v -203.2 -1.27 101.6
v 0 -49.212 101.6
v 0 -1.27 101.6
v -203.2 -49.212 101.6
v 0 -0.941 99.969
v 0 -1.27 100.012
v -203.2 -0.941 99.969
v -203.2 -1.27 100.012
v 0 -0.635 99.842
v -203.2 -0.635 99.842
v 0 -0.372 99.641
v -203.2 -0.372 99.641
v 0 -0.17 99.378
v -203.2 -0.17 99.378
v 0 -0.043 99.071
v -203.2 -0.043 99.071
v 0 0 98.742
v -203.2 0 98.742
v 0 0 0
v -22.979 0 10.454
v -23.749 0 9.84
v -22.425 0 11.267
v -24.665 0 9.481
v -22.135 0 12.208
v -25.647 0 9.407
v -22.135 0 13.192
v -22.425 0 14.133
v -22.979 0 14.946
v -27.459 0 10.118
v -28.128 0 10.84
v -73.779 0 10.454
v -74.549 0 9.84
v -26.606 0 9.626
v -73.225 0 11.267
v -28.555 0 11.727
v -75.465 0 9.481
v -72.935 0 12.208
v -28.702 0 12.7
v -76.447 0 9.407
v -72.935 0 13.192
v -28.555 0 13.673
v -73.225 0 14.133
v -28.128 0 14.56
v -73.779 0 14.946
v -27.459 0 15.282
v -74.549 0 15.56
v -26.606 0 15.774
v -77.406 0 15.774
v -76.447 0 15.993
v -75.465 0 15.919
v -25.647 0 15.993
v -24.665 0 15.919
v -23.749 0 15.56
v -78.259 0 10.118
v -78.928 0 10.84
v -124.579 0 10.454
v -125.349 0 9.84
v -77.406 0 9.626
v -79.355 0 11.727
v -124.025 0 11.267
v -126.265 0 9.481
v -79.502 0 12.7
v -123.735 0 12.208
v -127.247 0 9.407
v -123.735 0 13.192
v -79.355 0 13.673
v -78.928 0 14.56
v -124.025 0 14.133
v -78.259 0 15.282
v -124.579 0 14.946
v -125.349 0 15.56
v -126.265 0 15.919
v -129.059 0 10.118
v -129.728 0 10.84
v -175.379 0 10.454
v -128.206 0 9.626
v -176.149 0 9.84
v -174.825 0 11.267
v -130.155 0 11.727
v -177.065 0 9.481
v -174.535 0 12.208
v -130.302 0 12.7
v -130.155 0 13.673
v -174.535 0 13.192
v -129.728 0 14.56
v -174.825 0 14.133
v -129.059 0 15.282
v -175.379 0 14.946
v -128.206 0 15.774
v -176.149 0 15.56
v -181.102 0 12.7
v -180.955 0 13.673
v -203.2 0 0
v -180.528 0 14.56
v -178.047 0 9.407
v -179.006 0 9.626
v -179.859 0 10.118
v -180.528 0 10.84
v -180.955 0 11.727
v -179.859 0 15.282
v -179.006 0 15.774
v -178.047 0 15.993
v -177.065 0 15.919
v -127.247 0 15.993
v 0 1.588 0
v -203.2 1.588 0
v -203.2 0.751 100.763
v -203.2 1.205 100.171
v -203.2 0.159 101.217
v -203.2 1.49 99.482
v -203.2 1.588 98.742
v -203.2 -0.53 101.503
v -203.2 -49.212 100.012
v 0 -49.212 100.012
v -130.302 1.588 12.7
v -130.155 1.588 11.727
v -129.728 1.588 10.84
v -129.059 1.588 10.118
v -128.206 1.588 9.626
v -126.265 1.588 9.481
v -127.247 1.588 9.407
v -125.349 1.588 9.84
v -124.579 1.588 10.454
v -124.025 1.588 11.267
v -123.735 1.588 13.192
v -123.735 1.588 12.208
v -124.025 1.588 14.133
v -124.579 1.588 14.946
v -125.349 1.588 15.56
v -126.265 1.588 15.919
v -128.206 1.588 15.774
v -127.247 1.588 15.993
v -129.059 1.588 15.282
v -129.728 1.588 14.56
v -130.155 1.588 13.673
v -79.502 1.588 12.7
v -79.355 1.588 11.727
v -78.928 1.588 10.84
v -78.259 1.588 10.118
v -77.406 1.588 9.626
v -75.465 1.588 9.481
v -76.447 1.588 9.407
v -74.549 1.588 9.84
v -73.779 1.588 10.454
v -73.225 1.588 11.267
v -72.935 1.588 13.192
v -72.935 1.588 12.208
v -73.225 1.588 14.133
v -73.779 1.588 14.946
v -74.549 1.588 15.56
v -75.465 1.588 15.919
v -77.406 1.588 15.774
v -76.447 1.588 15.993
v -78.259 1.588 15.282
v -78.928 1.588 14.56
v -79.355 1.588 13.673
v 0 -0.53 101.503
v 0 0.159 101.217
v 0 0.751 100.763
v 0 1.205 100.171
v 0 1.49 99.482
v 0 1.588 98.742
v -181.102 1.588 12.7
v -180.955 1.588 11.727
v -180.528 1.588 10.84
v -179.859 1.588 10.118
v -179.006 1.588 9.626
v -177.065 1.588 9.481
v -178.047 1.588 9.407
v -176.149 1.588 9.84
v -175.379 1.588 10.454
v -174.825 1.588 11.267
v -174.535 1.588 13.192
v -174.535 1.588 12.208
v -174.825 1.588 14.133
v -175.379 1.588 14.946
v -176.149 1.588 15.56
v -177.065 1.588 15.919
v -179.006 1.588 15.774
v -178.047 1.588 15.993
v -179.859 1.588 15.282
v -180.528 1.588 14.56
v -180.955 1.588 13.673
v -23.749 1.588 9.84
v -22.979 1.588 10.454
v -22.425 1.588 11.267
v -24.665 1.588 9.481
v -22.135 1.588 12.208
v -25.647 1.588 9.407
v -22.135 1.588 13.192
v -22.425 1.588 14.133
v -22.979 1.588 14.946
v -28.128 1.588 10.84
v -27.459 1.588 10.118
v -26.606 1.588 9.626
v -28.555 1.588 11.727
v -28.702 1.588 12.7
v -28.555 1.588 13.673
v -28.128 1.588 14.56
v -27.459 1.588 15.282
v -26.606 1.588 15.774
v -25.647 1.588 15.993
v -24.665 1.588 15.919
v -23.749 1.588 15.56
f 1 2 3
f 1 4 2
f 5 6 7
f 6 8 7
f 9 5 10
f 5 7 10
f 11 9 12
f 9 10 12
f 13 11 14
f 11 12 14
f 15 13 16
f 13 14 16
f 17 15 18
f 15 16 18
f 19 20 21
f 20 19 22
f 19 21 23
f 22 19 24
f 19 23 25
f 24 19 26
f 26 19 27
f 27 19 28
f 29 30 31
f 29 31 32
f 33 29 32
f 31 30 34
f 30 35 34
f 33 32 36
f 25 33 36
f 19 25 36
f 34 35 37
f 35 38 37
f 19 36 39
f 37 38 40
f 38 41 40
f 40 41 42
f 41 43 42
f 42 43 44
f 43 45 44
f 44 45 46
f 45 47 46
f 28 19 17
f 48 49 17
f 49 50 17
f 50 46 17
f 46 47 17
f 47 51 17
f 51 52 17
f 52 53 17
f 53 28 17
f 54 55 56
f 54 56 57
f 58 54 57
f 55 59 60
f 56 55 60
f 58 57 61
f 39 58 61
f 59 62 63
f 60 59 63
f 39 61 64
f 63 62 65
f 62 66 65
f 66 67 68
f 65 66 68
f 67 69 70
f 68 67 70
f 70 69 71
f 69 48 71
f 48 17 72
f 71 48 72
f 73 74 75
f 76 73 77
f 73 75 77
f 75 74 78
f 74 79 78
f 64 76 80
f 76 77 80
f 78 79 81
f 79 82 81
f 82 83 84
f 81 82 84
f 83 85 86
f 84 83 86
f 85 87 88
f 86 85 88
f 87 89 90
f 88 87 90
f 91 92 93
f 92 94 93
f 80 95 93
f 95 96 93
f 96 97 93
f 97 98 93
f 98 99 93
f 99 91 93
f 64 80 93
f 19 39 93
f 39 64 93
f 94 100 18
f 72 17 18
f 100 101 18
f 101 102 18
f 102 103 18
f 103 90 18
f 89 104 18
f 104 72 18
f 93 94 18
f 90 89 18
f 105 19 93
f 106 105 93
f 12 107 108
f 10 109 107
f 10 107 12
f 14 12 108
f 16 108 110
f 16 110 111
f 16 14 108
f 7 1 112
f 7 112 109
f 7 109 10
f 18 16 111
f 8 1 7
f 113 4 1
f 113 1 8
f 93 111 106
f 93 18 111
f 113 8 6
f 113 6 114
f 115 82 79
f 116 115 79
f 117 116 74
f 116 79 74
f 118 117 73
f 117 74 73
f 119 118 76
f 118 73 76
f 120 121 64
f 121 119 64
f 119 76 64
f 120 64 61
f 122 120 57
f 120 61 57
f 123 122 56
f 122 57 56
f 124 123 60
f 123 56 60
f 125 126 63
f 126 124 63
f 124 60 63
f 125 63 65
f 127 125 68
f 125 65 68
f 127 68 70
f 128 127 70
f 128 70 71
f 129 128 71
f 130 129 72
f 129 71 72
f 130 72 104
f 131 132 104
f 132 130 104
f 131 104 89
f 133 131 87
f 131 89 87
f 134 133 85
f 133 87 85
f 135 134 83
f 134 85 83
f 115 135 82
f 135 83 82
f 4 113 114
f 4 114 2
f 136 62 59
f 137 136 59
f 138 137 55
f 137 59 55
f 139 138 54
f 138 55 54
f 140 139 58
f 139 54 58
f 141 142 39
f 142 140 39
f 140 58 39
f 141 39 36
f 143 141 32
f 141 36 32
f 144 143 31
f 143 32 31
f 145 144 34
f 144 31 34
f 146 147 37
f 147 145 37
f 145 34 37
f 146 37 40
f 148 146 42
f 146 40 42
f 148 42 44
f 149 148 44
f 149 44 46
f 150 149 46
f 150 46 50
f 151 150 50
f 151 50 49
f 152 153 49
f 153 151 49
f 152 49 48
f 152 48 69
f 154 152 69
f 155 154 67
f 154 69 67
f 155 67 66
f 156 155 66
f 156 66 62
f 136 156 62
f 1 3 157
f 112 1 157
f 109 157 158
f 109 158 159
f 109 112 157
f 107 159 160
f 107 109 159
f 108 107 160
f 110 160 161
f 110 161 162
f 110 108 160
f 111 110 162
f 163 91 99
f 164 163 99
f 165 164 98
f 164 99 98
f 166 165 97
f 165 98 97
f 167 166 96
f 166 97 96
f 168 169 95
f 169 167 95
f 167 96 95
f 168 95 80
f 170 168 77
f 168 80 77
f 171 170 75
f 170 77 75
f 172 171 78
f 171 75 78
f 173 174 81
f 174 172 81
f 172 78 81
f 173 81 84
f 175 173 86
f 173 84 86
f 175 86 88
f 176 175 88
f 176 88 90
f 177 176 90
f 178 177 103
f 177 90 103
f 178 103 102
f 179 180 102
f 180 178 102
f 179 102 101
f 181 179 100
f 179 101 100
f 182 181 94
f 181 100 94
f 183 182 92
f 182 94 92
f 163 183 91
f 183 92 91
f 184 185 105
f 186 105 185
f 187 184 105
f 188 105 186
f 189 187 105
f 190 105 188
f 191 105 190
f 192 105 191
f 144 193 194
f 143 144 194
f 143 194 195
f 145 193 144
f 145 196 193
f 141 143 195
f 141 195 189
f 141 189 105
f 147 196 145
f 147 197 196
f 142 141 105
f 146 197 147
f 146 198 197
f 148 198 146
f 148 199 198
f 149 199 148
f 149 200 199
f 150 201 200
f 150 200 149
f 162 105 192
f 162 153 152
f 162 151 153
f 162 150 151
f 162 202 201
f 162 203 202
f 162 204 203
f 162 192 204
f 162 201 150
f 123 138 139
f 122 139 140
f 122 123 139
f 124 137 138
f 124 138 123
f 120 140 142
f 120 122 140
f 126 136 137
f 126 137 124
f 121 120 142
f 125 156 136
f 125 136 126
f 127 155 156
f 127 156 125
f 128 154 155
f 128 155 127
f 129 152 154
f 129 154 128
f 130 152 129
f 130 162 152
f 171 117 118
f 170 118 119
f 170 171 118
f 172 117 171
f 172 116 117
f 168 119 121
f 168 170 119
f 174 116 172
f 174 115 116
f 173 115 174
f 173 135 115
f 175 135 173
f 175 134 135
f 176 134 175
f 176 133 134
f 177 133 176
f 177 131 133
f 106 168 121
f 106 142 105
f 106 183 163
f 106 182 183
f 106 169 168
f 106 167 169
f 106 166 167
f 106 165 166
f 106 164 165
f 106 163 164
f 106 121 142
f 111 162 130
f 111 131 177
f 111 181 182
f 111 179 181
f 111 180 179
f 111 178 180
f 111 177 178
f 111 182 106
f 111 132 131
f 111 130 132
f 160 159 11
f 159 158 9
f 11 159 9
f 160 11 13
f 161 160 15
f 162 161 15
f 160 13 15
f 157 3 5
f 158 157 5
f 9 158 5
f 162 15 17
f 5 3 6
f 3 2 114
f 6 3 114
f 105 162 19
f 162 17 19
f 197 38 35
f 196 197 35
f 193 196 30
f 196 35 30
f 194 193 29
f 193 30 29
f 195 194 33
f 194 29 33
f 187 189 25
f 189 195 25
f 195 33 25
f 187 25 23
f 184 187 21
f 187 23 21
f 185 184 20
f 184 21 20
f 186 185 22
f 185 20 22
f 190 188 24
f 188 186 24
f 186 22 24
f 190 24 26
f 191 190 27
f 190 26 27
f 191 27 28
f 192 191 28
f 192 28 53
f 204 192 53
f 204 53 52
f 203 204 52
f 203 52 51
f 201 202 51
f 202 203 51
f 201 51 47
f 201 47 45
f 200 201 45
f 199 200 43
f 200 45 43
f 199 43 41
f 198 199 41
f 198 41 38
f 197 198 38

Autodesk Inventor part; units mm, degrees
ref_plane "YZ Plane" through (0, 0, 0) normal (1, 0, 0) x (0, 1, 0)
ref_plane "XZ Plane" through (0, 0, 0) normal (0, 1, 0) x (-1, 0, 0)
ref_plane "XY Plane" through (0, 0, 0) normal (0, 0, 1) x (1, 0, 0)
sketch "Sketch1" plane through (0, 0, 0) normal (0, 1, 0) x (-1, 0, 0)
  line L0 (0, 0) -> (203.2, 0)
  line L1 (203.2, 0) -> (203.2, 25.4)
  line L2 (203.2, 25.4) -> (0, 25.4) construction
  line L3 (0, 25.4) -> (0, 0)
  line L4 (25.4, 12.7) -> (76.2, 12.7) construction
  circle A0 centre (25.4, 12.7) radius 3.302
  circle A1 centre (76.2, 12.7) radius 3.302
  line L5 (50.8, 25.4) -> (50.8, 0) construction
  circle A2 centre (127, 12.7) radius 3.302
  circle A3 centre (177.8, 12.7) radius 3.302
  line L6 (127, 12.7) -> (177.8, 12.7) construction
  line L7 (152.4, 25.4) -> (152.4, 0) construction
  line L8 (0, 25.4) -> (0, 101.6)
  line L9 (0, 101.6) -> (203.2, 101.6)
  line L10 (203.2, 101.6) -> (203.2, 25.4)
  point P0 (50.8, 12.7)
  point P1 (152.4, 12.7)
  dimension "d0" = 50.8
  dimension "d1" = 6.604
  dimension "d2" = 6.604
  dimension "d3" = 25.4
  dimension "d4" = 50.8
  dimension "d6" = 50.8
  dimension "d7" = 50.8
  dimension "d8" = 76.2
  dimension "d9" = 203.2
extrude "Plate1" add sketch "Sketch1" along normal blind 1.5875
sketch "Sketch2" plane through (-203.2, 1.5875, 100.0125) normal (0, 0, 1) x (1, 0, 0)
  line L0 (203.2, 0) -> (0, 0)
  line L1 (0, 0) -> (0, -50.8)
  line L2 (0, -50.8) -> (203.2, -50.8)
  line L3 (203.2, -50.8) -> (203.2, 0)
edge flange "Flange1" height 50.8 angle 90 thickness 1.5875 bend radius 1.27 thickness toward (0, 0, 1) relief tear relief width 1.5875 relief depth 0.7937 edges at (-101.6, 0, 101.6) wall of the first edge with corners at (0, 1.5875, 100.0125) (-203.2, 1.5875, 100.0125) (-203.2, -49.2125, 100.0125) (0, -49.2125, 100.0125)
bend "Bend1"
corner "Corner1"
equation "\"d11\" = BendReliefWidth"
equation "\"d12\" = BendReliefDepth"
equation "\"d13\" = MinimumRemnant"
equation "\"d14\" = BendRadius"
equation "\"d18\" = CornerReliefSize"
equation "\"d19\" = GapSize"
equation "\"d20\" = JacobiRadiusSize"
equation "\"BendRadius\" = Thickness"
equation "\"BendReliefWidth\" = Thickness"
equation "\"BendReliefDepth\" = 0.5 * Thickness"
equation "\"CornerReliefSize\" = 4 * Thickness"
equation "\"MinimumRemnant\" = 2 * Thickness"
equation "\"TransitionRadius\" = BendRadius"
equation "\"JacobiRadiusSize\" = BendRadius"
equation "\"GapSize\" = Thickness"
equation "\"d10\" = BendRadius"
equation "\"Thickness\" = 1.5875"
properties part number "Electrical Board Mount Part2" material "Aluminum 6061"
